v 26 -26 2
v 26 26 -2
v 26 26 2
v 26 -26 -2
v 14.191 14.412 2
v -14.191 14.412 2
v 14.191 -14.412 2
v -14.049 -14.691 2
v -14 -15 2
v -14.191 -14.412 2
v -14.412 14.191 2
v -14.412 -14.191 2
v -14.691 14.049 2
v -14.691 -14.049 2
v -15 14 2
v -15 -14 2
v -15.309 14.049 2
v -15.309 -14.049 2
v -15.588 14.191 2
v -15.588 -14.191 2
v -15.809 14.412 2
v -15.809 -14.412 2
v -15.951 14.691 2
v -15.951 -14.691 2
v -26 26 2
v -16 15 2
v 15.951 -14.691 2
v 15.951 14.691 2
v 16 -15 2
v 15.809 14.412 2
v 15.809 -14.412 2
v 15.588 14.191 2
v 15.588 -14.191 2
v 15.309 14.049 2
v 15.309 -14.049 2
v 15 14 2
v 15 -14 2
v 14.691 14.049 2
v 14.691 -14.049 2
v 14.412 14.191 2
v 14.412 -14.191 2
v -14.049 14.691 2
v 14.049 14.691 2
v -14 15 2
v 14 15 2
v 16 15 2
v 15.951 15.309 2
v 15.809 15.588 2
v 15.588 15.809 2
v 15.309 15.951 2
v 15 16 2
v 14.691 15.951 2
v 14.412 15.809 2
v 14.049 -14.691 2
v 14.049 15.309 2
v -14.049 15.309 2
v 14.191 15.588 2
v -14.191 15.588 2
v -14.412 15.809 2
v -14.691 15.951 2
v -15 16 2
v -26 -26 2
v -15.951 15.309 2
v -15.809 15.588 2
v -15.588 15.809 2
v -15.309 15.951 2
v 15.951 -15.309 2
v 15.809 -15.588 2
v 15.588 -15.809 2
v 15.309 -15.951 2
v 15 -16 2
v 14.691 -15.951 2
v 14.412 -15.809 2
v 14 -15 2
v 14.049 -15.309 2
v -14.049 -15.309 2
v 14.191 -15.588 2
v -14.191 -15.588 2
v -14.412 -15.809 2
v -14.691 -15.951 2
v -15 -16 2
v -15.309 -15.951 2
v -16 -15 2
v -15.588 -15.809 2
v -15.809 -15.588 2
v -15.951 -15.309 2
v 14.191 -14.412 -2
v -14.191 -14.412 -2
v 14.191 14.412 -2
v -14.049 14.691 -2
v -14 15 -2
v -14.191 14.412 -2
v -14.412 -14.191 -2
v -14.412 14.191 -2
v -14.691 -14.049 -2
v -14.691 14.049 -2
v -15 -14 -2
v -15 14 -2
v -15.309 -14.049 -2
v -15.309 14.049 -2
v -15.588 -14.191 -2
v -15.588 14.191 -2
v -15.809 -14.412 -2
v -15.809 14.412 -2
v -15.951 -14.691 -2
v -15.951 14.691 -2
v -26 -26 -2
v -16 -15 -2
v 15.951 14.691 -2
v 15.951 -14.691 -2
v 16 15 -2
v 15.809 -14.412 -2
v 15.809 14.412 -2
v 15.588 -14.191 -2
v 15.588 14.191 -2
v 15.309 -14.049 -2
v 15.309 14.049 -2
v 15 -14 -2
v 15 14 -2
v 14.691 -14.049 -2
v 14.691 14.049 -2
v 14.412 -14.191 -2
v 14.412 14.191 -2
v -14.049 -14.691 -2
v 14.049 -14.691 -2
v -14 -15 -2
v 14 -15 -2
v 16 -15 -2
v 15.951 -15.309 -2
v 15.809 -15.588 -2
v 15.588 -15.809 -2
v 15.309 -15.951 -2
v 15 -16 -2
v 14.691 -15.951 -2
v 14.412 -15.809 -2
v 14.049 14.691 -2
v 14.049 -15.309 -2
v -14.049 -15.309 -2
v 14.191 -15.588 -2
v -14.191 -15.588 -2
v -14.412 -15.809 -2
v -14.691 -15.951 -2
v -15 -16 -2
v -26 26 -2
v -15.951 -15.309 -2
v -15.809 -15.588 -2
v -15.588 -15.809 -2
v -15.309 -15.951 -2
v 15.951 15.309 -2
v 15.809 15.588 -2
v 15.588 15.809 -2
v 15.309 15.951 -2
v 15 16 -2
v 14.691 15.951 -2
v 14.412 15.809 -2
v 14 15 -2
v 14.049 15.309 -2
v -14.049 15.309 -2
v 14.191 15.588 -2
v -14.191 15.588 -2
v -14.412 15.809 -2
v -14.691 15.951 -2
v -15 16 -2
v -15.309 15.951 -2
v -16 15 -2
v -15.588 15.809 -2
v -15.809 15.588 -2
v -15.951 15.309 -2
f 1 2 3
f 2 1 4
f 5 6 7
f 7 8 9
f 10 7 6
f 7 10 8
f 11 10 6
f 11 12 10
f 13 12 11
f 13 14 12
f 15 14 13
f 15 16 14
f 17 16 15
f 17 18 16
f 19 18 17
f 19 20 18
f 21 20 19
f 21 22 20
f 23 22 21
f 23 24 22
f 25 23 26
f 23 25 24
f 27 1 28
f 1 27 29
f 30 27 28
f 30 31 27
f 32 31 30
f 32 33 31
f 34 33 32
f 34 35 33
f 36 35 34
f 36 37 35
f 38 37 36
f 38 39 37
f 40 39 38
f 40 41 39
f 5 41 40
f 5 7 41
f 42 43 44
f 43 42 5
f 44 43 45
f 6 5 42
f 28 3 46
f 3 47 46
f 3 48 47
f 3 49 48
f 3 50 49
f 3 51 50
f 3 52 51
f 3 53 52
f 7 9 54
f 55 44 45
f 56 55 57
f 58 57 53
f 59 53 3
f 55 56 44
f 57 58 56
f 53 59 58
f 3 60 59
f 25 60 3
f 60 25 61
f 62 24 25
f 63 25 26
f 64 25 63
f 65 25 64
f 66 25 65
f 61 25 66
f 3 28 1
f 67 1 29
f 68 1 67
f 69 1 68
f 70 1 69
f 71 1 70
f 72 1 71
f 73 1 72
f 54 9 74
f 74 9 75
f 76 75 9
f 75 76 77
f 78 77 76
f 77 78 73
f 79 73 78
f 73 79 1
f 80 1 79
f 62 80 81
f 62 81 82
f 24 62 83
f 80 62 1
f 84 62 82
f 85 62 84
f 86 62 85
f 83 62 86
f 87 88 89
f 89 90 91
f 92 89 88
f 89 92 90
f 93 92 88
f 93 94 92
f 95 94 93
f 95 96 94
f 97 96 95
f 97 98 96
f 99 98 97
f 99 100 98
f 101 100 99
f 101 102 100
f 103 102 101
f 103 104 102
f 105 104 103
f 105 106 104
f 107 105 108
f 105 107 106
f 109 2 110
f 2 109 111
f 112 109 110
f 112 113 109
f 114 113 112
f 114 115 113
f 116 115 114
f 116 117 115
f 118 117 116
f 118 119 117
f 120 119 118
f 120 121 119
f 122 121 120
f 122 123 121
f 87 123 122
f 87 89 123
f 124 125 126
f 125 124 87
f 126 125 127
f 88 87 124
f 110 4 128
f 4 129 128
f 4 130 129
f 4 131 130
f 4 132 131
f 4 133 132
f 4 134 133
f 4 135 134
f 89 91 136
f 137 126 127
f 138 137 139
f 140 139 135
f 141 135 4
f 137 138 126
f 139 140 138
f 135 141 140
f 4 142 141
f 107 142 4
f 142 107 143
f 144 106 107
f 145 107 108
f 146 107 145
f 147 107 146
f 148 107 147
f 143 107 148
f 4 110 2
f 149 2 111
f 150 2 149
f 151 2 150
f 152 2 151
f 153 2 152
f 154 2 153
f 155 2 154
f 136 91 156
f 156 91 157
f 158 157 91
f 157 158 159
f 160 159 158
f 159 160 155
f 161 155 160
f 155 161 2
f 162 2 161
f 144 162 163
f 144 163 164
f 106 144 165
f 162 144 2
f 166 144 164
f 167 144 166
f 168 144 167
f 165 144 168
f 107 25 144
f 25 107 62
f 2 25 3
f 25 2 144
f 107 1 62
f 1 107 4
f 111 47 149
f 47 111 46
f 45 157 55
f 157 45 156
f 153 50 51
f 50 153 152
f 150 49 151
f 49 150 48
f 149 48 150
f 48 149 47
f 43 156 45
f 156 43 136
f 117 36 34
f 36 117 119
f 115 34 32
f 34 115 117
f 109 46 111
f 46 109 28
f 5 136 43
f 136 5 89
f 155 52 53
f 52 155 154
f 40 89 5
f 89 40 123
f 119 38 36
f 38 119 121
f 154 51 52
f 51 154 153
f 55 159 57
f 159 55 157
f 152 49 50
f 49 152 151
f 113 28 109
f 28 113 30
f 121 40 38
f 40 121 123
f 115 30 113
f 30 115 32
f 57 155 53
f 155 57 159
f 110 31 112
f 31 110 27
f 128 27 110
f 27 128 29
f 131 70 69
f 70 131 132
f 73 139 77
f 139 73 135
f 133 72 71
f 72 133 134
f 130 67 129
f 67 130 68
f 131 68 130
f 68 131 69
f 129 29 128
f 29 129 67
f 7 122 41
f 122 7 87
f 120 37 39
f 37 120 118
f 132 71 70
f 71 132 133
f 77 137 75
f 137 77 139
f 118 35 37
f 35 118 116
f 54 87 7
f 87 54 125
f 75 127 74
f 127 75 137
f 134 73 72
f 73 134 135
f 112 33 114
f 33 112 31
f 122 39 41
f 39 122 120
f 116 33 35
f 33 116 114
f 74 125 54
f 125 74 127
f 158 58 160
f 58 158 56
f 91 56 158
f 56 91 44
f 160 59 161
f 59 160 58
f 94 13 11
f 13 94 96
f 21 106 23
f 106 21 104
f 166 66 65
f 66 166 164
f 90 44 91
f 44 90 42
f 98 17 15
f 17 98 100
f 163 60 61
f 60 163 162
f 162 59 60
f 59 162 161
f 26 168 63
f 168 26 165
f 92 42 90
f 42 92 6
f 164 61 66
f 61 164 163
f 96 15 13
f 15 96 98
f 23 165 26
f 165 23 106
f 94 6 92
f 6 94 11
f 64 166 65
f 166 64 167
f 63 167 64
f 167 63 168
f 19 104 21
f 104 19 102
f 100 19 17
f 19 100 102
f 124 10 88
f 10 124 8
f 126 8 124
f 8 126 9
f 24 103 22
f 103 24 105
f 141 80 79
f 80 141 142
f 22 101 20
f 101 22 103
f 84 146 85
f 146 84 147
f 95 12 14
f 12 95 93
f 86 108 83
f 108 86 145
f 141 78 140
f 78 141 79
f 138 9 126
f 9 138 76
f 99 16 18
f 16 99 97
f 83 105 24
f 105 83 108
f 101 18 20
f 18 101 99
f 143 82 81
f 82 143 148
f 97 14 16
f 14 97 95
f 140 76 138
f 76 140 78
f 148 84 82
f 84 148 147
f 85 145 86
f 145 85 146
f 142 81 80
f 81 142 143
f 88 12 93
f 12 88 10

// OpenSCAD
//-------------------------------------------------------------------------
//-- base.scad
//-------------------------------------------------------------------------
//--This file has been generated automatically according to your data.
//--For more info, visit: http://iearobotics.com/oomlwiki/
//--------------------------------------------------------------------------

difference() {
  cube(size=[52.000, 52.000, 4.000], center=true);
  cube(size=[0.000, 0.000, 4.100], center=true);
  cube(size=[0.000, 0.000, 4.100], center=true);
  translate(v=[15.000, 15.000, 0.000]) {
    cylinder(h=4.100, r1=1.000, r2=1.000, $fn=20, center=true);
  } // End translate
  translate(v=[15.000, -15.000, 0.000]) {
    cylinder(h=4.100, r1=1.000, r2=1.000, $fn=20, center=true);
  } // End translate
  translate(v=[-15.000, 15.000, 0.000]) {
    cylinder(h=4.100, r1=1.000, r2=1.000, $fn=20, center=true);
  } // End translate
  translate(v=[-15.000, -15.000, 0.000]) {
    cylinder(h=4.100, r1=1.000, r2=1.000, $fn=20, center=true);
  } // End translate
} // End difference
